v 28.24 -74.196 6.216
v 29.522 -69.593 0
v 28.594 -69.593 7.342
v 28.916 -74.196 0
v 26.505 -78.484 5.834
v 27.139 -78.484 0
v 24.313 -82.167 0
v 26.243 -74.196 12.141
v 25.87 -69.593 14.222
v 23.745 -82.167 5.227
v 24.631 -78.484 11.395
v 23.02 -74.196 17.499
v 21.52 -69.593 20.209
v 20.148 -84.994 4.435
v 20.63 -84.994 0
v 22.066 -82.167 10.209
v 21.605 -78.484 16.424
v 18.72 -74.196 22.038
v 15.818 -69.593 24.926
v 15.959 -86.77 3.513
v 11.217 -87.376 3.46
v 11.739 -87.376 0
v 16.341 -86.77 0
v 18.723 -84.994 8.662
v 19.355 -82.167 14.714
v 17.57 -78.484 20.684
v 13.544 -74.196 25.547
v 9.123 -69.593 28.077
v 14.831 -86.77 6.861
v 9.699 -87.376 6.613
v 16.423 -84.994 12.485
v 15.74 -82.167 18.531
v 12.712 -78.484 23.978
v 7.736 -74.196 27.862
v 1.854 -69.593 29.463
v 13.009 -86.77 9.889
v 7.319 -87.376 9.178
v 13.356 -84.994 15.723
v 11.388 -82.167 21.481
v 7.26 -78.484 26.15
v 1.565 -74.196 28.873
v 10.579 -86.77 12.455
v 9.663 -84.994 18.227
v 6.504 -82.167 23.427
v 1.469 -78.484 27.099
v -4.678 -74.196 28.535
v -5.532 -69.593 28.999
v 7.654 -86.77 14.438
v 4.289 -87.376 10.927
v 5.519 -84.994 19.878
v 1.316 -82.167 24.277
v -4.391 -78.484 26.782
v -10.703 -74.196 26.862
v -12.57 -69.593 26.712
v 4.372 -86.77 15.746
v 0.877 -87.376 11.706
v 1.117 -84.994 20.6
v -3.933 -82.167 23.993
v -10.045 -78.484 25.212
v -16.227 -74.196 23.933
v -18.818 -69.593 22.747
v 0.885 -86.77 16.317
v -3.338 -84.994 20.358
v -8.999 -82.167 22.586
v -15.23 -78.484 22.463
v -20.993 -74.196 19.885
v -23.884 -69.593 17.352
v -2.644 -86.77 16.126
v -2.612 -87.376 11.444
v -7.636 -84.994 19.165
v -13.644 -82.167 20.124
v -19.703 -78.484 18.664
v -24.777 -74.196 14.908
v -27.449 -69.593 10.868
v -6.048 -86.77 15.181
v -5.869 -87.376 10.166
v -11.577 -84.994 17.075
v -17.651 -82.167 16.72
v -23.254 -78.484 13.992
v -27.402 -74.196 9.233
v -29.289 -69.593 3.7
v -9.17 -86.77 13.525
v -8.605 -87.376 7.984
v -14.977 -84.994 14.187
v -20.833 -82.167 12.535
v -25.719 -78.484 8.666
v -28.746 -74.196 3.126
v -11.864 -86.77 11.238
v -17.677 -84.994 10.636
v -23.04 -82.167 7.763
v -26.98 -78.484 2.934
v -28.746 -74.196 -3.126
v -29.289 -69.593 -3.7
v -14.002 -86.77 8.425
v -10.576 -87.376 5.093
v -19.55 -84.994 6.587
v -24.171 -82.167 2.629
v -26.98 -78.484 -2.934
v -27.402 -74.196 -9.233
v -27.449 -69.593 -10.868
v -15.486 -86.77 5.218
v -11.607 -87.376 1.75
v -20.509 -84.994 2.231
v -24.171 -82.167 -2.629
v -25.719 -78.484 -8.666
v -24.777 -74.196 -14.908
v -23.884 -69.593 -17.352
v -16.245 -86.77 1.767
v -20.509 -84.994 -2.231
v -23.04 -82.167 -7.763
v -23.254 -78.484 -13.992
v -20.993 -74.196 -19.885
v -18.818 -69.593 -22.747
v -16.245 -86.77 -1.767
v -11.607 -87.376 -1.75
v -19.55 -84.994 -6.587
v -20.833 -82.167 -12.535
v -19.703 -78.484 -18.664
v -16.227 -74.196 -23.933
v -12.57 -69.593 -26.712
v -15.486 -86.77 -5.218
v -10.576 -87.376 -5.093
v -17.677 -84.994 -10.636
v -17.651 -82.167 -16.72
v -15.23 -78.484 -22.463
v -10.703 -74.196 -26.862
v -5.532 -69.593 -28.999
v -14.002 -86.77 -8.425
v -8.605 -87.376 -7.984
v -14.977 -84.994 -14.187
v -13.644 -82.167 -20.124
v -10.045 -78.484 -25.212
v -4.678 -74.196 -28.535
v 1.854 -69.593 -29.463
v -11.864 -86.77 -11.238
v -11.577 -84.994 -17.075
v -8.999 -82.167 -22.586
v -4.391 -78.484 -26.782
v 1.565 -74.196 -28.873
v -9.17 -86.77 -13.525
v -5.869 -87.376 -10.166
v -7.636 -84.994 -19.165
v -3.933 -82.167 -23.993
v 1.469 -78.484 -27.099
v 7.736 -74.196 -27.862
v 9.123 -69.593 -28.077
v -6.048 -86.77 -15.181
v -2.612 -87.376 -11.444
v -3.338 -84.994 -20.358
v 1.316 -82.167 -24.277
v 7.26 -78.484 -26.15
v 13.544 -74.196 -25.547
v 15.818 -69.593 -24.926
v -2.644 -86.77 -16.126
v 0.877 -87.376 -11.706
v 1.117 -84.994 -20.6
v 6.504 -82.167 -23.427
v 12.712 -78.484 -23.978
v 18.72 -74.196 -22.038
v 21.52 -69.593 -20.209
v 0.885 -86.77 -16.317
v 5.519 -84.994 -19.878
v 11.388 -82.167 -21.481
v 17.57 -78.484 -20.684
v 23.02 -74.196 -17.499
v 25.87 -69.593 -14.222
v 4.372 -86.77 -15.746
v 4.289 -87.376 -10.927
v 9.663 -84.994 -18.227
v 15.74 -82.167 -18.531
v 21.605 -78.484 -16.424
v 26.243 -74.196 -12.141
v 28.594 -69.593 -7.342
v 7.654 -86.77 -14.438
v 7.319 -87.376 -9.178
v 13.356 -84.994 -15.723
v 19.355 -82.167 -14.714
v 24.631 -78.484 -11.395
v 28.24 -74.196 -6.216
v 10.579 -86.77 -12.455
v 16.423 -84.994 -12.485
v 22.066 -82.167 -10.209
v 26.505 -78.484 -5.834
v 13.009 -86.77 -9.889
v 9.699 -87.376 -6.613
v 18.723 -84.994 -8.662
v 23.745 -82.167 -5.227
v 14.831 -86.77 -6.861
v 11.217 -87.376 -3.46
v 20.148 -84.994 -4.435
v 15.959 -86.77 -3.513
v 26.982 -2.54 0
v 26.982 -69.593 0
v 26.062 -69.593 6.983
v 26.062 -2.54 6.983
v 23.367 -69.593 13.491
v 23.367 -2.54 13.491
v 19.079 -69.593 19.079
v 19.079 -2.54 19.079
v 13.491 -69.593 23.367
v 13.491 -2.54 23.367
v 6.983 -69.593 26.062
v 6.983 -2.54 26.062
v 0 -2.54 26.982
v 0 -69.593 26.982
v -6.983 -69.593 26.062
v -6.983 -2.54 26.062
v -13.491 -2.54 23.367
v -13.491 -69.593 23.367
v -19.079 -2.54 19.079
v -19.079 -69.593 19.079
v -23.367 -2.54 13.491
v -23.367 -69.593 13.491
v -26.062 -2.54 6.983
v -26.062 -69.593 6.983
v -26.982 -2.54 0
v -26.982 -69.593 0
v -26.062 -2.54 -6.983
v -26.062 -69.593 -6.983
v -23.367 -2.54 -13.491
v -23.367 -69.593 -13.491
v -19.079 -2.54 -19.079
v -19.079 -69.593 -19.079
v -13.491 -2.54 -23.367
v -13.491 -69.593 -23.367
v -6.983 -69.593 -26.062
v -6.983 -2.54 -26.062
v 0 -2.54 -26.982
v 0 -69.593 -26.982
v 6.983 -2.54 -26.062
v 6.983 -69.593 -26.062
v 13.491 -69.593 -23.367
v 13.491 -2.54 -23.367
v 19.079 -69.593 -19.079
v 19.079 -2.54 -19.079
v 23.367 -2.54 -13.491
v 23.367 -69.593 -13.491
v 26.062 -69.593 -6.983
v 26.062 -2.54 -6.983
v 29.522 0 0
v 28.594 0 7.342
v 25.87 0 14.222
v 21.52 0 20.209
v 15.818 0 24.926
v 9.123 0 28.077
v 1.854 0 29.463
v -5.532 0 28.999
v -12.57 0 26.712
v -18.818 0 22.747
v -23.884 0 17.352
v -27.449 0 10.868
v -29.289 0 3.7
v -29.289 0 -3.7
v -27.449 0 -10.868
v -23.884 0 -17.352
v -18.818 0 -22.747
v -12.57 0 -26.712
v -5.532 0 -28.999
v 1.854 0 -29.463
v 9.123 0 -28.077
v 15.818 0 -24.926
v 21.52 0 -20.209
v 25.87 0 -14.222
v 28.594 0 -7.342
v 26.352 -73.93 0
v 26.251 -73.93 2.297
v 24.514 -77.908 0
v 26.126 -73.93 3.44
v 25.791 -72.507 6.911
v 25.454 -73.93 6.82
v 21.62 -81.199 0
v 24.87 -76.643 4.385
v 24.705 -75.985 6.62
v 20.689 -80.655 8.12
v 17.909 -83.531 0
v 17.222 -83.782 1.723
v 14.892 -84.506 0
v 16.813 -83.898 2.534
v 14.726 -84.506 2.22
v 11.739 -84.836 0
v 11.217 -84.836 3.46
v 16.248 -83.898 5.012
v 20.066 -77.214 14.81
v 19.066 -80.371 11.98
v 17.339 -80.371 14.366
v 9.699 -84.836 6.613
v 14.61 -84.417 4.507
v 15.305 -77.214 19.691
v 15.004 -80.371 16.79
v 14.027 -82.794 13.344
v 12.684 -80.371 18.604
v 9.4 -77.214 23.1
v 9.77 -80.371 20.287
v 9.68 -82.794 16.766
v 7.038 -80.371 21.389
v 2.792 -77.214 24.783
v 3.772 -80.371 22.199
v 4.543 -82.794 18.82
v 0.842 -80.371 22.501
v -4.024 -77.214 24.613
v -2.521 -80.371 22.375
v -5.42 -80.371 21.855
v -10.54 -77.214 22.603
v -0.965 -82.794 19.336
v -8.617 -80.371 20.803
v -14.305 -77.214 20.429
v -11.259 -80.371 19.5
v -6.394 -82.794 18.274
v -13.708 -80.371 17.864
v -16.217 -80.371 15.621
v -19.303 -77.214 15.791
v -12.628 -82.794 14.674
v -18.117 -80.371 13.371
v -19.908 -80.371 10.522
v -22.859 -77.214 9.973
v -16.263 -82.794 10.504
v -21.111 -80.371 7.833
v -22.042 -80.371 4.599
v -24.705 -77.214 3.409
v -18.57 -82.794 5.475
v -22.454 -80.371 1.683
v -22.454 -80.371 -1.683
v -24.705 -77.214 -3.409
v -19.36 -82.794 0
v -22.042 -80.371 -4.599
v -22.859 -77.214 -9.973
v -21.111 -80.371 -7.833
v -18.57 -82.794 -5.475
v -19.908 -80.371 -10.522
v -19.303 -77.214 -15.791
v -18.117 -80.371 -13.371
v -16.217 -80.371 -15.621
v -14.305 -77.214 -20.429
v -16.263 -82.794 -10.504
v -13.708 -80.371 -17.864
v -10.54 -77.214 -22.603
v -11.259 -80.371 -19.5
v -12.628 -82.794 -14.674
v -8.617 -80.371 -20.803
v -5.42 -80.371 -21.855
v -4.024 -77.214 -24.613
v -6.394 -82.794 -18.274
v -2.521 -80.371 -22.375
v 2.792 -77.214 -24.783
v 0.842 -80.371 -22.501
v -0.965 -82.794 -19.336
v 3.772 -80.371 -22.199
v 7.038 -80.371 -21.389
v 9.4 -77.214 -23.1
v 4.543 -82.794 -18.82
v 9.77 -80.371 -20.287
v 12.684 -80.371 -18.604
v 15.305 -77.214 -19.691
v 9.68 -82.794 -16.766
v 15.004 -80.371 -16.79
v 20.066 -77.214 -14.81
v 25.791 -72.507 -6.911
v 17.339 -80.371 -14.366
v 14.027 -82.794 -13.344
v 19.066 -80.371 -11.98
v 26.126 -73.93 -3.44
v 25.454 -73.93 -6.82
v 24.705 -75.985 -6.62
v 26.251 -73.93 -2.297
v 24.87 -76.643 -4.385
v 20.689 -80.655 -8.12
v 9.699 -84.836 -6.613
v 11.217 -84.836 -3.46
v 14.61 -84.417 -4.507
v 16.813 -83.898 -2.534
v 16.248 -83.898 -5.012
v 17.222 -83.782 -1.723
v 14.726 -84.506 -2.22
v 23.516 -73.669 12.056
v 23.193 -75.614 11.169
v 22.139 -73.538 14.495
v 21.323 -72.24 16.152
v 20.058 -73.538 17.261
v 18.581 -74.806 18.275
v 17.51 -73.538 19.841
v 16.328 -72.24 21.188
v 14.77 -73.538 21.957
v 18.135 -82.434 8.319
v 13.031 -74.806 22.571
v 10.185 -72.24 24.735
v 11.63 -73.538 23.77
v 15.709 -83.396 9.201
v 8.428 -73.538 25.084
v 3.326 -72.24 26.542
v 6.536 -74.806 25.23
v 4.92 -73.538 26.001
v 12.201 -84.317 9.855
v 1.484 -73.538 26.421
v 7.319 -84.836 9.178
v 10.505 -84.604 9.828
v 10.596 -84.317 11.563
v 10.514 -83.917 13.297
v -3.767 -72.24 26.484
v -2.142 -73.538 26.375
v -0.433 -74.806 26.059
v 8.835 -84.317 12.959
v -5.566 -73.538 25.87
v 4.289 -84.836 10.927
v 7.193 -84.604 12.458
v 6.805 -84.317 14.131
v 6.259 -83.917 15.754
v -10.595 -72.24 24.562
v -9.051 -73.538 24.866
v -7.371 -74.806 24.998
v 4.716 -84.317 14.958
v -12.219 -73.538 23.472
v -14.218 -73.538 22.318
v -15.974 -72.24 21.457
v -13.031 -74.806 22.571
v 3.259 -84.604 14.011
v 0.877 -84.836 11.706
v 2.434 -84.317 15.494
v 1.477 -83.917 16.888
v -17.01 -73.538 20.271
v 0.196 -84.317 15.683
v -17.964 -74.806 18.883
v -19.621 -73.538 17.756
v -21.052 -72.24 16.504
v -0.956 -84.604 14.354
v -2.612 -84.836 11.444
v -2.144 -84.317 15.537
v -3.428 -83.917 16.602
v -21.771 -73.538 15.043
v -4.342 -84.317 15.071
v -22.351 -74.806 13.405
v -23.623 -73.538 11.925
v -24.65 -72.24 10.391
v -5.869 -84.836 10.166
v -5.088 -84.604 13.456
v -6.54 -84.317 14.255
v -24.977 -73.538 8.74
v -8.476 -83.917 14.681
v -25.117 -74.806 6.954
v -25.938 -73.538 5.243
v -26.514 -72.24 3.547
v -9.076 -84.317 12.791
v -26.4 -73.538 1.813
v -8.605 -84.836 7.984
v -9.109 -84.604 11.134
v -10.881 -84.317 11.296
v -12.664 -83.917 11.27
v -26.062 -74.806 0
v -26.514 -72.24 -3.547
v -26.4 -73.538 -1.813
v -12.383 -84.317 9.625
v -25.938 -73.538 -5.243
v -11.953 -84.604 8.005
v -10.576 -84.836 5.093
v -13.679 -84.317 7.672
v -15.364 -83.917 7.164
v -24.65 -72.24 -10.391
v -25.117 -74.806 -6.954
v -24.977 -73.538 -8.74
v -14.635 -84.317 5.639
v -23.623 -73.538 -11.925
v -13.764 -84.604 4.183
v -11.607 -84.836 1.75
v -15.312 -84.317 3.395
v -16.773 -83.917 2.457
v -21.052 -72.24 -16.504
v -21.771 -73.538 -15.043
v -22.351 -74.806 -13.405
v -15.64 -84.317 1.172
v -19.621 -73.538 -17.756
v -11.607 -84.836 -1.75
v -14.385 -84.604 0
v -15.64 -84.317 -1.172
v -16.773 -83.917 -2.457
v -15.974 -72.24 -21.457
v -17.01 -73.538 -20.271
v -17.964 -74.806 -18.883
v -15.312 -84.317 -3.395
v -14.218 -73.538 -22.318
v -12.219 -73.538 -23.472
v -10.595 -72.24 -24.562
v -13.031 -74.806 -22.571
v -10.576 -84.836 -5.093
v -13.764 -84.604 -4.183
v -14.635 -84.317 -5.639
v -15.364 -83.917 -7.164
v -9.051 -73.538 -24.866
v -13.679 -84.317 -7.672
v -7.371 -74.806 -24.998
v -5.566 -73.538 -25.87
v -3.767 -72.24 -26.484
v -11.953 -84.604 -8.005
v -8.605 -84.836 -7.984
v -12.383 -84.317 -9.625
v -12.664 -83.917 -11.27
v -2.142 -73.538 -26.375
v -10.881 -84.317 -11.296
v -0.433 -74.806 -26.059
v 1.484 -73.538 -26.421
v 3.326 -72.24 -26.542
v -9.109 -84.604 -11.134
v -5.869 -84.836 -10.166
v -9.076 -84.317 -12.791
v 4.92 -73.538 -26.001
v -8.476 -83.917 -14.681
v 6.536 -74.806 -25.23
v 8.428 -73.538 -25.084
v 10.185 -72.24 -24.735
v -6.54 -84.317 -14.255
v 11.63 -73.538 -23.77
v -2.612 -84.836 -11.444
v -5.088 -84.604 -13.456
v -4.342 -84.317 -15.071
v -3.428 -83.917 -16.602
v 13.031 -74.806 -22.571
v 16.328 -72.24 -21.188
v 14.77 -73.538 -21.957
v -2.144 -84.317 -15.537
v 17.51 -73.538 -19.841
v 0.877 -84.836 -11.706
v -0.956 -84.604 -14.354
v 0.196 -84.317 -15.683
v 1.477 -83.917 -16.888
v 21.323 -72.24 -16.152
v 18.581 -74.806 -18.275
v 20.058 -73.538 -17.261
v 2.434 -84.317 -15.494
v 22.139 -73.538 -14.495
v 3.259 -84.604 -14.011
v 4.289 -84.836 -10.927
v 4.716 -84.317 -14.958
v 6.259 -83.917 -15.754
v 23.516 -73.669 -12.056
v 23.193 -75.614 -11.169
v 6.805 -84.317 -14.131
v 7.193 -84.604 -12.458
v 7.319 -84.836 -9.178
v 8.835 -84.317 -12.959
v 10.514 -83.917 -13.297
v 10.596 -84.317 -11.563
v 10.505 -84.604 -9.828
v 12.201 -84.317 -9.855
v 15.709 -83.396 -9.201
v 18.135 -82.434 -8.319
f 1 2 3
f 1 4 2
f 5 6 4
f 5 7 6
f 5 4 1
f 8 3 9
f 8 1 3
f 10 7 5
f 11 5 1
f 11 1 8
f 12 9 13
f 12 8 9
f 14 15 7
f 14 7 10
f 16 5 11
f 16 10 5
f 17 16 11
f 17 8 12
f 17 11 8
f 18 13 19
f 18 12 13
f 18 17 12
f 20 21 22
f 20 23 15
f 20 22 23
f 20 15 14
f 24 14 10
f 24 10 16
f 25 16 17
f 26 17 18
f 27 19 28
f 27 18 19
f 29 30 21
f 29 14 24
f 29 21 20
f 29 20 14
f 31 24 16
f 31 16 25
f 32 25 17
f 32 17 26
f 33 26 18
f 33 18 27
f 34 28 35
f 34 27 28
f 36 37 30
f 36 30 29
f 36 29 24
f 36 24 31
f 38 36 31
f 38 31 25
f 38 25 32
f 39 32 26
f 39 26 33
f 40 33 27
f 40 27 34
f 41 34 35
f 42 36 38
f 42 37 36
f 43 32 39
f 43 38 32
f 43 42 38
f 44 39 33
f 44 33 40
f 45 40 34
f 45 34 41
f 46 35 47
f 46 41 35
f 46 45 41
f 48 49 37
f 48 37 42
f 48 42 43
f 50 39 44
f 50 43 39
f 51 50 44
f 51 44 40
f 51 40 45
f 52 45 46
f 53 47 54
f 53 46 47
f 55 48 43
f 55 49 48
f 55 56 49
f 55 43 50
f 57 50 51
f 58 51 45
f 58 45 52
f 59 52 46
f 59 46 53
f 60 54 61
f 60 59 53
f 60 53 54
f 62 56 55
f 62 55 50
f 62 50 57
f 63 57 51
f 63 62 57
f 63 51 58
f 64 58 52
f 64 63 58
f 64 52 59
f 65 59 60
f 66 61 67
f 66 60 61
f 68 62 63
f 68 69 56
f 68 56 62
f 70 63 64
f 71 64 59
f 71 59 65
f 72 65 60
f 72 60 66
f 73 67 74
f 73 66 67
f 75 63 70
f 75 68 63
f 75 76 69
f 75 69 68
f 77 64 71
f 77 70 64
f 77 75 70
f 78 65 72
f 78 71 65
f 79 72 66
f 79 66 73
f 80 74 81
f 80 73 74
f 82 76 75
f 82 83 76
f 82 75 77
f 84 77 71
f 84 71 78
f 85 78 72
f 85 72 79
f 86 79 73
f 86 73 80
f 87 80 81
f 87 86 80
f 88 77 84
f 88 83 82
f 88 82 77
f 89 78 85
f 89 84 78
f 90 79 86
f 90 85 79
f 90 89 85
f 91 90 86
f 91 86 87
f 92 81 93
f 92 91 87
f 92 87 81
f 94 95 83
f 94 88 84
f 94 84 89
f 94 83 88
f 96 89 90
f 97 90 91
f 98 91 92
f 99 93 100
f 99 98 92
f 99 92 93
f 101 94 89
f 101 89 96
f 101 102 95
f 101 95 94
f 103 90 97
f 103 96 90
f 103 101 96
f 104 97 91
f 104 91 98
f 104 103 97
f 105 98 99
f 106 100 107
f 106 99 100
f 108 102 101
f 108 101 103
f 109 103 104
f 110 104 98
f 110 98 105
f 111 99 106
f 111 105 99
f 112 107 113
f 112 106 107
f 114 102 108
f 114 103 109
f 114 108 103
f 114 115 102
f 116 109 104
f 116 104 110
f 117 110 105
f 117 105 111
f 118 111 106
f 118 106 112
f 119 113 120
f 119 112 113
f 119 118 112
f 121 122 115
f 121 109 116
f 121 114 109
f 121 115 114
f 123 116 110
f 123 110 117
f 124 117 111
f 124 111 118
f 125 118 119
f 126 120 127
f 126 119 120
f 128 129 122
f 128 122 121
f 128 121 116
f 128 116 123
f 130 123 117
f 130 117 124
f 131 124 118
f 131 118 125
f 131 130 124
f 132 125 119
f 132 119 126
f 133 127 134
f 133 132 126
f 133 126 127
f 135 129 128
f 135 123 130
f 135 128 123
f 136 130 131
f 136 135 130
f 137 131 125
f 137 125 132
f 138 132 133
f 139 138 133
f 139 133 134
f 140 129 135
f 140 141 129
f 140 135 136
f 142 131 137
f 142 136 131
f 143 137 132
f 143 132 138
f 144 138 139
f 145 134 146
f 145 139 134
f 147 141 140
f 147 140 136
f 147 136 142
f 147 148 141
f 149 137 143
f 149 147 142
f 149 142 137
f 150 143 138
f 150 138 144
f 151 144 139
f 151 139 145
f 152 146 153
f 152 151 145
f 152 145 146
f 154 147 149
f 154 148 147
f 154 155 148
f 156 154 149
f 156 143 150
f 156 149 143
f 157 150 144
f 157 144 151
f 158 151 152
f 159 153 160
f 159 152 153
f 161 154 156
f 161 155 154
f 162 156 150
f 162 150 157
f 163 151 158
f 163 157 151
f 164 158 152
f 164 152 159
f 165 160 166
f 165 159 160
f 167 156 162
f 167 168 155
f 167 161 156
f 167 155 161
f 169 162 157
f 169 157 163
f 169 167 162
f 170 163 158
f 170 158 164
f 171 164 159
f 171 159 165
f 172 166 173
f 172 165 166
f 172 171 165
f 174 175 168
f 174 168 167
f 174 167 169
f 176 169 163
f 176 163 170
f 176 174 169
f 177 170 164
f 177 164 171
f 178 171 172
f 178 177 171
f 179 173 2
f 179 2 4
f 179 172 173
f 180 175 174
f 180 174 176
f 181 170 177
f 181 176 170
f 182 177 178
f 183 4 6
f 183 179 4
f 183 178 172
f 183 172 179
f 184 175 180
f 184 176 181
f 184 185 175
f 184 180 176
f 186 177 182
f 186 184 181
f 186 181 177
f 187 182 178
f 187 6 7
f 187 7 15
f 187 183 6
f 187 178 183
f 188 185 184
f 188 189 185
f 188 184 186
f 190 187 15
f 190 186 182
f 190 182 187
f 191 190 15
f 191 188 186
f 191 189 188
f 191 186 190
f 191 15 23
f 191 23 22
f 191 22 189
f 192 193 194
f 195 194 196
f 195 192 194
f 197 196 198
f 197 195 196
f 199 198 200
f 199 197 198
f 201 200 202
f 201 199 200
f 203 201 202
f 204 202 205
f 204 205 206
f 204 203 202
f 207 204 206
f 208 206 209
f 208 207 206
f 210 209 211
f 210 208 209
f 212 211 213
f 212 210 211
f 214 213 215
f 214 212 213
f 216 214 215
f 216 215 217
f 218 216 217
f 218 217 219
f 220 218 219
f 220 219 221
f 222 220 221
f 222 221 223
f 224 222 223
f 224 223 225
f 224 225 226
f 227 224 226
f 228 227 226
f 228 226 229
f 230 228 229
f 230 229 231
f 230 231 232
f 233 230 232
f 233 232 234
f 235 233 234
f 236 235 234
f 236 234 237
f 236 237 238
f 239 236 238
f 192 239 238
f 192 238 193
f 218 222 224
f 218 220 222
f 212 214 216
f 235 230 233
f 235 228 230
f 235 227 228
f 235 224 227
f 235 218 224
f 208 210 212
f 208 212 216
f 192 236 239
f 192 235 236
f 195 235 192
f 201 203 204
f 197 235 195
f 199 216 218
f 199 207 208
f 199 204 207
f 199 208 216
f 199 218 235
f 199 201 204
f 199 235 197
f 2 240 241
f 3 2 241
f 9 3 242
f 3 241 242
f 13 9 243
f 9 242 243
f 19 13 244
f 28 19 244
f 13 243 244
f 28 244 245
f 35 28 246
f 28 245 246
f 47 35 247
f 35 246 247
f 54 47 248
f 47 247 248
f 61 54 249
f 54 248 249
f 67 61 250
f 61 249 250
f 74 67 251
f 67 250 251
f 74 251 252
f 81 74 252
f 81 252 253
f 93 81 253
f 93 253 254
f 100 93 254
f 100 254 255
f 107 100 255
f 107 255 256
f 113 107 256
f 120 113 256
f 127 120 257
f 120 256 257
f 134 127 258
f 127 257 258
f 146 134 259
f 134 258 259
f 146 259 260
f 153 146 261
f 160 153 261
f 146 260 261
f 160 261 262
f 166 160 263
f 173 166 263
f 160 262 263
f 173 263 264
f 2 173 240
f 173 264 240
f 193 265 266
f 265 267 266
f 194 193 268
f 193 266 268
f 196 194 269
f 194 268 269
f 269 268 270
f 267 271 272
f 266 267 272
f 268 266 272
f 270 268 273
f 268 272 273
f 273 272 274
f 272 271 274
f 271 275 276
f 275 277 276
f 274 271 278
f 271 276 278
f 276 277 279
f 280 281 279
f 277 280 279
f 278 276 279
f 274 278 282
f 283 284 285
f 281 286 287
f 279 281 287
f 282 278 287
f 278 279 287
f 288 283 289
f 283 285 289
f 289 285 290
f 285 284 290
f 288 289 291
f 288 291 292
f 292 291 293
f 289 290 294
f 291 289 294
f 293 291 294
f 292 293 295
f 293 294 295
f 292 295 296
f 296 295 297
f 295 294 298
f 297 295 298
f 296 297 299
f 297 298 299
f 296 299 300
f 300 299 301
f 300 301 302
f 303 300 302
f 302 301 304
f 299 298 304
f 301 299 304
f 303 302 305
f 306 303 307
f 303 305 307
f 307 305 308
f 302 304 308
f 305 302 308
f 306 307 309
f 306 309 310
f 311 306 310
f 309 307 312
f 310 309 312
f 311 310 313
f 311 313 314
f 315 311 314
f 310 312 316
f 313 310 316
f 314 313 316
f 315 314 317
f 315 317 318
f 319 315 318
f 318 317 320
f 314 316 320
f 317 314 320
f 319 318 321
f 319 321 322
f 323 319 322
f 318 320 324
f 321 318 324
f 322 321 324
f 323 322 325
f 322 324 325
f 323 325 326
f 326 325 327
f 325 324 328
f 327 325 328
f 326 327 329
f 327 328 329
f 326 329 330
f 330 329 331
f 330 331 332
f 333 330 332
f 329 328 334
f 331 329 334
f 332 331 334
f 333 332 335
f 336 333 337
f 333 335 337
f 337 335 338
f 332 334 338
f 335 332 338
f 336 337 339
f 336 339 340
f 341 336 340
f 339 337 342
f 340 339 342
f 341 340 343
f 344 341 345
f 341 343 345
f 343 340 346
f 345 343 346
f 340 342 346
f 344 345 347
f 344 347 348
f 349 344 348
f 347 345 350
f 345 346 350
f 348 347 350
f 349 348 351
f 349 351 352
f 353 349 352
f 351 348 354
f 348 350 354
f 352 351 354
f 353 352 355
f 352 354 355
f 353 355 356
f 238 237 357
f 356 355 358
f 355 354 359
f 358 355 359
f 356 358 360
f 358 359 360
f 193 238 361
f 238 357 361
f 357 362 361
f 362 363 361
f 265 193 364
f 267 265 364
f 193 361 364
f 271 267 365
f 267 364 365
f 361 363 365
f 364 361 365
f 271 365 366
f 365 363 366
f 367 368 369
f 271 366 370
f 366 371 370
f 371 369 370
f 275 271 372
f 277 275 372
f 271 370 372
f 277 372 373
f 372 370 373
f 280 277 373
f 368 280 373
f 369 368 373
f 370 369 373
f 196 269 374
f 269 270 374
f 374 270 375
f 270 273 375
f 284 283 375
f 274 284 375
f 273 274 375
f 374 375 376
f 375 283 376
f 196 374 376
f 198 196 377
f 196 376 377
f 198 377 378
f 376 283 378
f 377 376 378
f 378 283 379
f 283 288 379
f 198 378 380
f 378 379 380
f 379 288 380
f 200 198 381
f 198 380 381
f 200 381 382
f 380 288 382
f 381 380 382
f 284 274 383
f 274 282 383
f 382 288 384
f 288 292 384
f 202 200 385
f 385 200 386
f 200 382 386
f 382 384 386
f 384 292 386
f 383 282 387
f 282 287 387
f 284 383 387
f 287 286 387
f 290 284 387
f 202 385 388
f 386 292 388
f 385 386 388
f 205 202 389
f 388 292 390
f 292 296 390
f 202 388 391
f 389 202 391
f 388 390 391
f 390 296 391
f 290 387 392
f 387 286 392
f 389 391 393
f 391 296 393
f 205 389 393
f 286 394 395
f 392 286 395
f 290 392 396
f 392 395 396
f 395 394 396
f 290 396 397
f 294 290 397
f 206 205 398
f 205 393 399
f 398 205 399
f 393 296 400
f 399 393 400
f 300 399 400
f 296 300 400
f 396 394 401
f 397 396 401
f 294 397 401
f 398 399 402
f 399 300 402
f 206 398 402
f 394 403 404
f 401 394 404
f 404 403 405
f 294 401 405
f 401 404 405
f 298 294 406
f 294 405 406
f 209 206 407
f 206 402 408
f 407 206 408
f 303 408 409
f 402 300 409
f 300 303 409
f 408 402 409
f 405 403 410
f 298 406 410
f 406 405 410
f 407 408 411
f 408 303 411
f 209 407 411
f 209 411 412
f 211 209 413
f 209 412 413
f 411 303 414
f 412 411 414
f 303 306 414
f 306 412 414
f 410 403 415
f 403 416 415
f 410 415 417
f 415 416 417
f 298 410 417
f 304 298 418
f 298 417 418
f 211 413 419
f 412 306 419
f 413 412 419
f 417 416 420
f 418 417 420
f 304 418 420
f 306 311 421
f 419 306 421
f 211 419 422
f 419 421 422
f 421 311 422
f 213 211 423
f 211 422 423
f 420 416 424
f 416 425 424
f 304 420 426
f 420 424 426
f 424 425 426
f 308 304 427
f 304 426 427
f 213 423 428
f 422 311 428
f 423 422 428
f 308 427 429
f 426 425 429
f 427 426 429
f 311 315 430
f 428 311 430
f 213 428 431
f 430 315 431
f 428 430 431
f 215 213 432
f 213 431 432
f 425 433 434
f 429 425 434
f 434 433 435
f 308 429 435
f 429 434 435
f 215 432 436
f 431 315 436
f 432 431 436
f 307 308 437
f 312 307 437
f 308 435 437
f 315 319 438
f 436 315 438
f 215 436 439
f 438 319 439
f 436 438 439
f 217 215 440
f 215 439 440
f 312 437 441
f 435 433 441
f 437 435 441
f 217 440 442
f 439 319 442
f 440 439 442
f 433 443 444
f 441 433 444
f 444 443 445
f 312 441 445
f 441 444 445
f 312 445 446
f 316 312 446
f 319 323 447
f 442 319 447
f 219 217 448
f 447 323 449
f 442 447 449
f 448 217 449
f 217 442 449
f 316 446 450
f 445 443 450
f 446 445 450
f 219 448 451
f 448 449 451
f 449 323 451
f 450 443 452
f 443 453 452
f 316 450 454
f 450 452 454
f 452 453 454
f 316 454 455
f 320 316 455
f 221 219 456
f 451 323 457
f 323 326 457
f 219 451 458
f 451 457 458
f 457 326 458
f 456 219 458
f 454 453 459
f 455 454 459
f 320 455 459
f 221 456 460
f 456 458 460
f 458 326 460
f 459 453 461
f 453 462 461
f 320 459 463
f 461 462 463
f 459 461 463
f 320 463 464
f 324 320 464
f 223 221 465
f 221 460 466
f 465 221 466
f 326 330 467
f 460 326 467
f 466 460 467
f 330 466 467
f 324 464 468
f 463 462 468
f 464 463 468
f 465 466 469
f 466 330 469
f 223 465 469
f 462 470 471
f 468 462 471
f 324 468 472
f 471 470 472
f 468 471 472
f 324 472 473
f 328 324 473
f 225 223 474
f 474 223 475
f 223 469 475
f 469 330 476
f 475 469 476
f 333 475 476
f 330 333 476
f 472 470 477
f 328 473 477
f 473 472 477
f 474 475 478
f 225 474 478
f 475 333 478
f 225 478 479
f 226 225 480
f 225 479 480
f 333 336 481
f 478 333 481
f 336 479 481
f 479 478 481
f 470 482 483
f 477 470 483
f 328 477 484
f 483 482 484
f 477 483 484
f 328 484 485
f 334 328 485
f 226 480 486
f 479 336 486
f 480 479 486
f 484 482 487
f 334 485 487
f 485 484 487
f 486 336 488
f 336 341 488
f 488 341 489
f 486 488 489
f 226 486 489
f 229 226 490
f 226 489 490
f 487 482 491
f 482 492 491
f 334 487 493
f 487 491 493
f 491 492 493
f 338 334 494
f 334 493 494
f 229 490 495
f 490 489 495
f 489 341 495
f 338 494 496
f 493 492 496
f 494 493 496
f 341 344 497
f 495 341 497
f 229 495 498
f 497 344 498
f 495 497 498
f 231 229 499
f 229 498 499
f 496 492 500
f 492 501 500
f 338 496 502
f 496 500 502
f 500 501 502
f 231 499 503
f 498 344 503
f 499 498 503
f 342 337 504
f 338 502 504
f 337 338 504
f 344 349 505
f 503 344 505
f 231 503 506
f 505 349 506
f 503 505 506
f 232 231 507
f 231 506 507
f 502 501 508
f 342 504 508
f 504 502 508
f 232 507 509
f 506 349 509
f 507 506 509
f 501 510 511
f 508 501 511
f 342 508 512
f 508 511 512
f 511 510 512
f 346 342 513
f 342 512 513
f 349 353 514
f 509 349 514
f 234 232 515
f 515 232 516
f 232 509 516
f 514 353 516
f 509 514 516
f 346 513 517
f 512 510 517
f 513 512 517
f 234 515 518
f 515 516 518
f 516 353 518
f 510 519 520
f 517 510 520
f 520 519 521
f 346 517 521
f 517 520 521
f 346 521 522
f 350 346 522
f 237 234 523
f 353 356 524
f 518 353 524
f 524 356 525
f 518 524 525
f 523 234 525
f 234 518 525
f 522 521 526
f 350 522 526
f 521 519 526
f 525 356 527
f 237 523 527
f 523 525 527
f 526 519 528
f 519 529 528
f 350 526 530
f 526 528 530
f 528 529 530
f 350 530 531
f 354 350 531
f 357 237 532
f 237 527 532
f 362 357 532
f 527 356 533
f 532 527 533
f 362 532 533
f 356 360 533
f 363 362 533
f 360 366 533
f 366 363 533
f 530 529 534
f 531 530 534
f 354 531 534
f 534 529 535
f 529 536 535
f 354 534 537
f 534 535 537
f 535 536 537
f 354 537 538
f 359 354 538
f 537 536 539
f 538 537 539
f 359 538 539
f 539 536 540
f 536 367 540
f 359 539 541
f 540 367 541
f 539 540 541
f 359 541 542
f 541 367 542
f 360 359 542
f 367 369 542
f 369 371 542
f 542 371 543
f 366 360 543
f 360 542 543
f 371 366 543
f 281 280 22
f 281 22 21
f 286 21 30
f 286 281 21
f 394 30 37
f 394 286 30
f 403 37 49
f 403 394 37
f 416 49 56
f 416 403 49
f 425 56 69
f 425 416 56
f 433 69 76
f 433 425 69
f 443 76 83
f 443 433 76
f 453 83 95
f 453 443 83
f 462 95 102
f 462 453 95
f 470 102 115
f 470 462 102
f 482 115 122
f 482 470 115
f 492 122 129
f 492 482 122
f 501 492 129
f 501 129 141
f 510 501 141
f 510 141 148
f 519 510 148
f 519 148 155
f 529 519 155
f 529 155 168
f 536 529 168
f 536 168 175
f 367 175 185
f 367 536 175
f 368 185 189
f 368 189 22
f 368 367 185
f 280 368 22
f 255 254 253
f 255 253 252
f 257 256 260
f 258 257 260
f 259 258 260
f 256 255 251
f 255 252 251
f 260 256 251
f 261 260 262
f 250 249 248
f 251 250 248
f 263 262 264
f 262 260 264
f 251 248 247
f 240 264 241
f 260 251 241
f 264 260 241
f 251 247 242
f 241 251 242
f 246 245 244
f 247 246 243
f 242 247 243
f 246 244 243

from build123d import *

# Parameters (mm, degrees)
F0_R     = 29.5216604649
F1_DEPTH = 87.376
F2_R     = 17.7830971004
F3_T     = -2.54


# Not quite as in the source:
# - a shell that OpenCascade refuses in one call is made with other operations: the cavity is built on its own and cut out


with BuildPart() as f1:
    # F0 (on Front) → F1 (new body)
    with BuildSketch(Plane.XZ):
        Circle(F0_R)
    extrude(amount=F1_DEPTH)

    # F2
    f2_edges = [f1.edges().sort_by_distance(p)[0] for p in [
        (-29.52166, -87.376, 0),
    ]]
    fillet(f2_edges, radius=F2_R)

    # F3: a shell. OpenCascade refuses it in one call, so the cavity is built on its own and cut out:
    # the body offset inwards by the wall thickness, plus a prism from it out through each open face.
    f3_core = offset(f1.part, amount=F3_T, mode=Mode.PRIVATE)
    f3_exits = [f3_core.faces().sort_by_distance(p)[0] for p in [
        (0, -84.836, 0),
    ]]
    add(f3_core, mode=Mode.SUBTRACT)
    extrude(f3_exits, amount=-F3_T, mode=Mode.SUBTRACT)


solid = f1.part
